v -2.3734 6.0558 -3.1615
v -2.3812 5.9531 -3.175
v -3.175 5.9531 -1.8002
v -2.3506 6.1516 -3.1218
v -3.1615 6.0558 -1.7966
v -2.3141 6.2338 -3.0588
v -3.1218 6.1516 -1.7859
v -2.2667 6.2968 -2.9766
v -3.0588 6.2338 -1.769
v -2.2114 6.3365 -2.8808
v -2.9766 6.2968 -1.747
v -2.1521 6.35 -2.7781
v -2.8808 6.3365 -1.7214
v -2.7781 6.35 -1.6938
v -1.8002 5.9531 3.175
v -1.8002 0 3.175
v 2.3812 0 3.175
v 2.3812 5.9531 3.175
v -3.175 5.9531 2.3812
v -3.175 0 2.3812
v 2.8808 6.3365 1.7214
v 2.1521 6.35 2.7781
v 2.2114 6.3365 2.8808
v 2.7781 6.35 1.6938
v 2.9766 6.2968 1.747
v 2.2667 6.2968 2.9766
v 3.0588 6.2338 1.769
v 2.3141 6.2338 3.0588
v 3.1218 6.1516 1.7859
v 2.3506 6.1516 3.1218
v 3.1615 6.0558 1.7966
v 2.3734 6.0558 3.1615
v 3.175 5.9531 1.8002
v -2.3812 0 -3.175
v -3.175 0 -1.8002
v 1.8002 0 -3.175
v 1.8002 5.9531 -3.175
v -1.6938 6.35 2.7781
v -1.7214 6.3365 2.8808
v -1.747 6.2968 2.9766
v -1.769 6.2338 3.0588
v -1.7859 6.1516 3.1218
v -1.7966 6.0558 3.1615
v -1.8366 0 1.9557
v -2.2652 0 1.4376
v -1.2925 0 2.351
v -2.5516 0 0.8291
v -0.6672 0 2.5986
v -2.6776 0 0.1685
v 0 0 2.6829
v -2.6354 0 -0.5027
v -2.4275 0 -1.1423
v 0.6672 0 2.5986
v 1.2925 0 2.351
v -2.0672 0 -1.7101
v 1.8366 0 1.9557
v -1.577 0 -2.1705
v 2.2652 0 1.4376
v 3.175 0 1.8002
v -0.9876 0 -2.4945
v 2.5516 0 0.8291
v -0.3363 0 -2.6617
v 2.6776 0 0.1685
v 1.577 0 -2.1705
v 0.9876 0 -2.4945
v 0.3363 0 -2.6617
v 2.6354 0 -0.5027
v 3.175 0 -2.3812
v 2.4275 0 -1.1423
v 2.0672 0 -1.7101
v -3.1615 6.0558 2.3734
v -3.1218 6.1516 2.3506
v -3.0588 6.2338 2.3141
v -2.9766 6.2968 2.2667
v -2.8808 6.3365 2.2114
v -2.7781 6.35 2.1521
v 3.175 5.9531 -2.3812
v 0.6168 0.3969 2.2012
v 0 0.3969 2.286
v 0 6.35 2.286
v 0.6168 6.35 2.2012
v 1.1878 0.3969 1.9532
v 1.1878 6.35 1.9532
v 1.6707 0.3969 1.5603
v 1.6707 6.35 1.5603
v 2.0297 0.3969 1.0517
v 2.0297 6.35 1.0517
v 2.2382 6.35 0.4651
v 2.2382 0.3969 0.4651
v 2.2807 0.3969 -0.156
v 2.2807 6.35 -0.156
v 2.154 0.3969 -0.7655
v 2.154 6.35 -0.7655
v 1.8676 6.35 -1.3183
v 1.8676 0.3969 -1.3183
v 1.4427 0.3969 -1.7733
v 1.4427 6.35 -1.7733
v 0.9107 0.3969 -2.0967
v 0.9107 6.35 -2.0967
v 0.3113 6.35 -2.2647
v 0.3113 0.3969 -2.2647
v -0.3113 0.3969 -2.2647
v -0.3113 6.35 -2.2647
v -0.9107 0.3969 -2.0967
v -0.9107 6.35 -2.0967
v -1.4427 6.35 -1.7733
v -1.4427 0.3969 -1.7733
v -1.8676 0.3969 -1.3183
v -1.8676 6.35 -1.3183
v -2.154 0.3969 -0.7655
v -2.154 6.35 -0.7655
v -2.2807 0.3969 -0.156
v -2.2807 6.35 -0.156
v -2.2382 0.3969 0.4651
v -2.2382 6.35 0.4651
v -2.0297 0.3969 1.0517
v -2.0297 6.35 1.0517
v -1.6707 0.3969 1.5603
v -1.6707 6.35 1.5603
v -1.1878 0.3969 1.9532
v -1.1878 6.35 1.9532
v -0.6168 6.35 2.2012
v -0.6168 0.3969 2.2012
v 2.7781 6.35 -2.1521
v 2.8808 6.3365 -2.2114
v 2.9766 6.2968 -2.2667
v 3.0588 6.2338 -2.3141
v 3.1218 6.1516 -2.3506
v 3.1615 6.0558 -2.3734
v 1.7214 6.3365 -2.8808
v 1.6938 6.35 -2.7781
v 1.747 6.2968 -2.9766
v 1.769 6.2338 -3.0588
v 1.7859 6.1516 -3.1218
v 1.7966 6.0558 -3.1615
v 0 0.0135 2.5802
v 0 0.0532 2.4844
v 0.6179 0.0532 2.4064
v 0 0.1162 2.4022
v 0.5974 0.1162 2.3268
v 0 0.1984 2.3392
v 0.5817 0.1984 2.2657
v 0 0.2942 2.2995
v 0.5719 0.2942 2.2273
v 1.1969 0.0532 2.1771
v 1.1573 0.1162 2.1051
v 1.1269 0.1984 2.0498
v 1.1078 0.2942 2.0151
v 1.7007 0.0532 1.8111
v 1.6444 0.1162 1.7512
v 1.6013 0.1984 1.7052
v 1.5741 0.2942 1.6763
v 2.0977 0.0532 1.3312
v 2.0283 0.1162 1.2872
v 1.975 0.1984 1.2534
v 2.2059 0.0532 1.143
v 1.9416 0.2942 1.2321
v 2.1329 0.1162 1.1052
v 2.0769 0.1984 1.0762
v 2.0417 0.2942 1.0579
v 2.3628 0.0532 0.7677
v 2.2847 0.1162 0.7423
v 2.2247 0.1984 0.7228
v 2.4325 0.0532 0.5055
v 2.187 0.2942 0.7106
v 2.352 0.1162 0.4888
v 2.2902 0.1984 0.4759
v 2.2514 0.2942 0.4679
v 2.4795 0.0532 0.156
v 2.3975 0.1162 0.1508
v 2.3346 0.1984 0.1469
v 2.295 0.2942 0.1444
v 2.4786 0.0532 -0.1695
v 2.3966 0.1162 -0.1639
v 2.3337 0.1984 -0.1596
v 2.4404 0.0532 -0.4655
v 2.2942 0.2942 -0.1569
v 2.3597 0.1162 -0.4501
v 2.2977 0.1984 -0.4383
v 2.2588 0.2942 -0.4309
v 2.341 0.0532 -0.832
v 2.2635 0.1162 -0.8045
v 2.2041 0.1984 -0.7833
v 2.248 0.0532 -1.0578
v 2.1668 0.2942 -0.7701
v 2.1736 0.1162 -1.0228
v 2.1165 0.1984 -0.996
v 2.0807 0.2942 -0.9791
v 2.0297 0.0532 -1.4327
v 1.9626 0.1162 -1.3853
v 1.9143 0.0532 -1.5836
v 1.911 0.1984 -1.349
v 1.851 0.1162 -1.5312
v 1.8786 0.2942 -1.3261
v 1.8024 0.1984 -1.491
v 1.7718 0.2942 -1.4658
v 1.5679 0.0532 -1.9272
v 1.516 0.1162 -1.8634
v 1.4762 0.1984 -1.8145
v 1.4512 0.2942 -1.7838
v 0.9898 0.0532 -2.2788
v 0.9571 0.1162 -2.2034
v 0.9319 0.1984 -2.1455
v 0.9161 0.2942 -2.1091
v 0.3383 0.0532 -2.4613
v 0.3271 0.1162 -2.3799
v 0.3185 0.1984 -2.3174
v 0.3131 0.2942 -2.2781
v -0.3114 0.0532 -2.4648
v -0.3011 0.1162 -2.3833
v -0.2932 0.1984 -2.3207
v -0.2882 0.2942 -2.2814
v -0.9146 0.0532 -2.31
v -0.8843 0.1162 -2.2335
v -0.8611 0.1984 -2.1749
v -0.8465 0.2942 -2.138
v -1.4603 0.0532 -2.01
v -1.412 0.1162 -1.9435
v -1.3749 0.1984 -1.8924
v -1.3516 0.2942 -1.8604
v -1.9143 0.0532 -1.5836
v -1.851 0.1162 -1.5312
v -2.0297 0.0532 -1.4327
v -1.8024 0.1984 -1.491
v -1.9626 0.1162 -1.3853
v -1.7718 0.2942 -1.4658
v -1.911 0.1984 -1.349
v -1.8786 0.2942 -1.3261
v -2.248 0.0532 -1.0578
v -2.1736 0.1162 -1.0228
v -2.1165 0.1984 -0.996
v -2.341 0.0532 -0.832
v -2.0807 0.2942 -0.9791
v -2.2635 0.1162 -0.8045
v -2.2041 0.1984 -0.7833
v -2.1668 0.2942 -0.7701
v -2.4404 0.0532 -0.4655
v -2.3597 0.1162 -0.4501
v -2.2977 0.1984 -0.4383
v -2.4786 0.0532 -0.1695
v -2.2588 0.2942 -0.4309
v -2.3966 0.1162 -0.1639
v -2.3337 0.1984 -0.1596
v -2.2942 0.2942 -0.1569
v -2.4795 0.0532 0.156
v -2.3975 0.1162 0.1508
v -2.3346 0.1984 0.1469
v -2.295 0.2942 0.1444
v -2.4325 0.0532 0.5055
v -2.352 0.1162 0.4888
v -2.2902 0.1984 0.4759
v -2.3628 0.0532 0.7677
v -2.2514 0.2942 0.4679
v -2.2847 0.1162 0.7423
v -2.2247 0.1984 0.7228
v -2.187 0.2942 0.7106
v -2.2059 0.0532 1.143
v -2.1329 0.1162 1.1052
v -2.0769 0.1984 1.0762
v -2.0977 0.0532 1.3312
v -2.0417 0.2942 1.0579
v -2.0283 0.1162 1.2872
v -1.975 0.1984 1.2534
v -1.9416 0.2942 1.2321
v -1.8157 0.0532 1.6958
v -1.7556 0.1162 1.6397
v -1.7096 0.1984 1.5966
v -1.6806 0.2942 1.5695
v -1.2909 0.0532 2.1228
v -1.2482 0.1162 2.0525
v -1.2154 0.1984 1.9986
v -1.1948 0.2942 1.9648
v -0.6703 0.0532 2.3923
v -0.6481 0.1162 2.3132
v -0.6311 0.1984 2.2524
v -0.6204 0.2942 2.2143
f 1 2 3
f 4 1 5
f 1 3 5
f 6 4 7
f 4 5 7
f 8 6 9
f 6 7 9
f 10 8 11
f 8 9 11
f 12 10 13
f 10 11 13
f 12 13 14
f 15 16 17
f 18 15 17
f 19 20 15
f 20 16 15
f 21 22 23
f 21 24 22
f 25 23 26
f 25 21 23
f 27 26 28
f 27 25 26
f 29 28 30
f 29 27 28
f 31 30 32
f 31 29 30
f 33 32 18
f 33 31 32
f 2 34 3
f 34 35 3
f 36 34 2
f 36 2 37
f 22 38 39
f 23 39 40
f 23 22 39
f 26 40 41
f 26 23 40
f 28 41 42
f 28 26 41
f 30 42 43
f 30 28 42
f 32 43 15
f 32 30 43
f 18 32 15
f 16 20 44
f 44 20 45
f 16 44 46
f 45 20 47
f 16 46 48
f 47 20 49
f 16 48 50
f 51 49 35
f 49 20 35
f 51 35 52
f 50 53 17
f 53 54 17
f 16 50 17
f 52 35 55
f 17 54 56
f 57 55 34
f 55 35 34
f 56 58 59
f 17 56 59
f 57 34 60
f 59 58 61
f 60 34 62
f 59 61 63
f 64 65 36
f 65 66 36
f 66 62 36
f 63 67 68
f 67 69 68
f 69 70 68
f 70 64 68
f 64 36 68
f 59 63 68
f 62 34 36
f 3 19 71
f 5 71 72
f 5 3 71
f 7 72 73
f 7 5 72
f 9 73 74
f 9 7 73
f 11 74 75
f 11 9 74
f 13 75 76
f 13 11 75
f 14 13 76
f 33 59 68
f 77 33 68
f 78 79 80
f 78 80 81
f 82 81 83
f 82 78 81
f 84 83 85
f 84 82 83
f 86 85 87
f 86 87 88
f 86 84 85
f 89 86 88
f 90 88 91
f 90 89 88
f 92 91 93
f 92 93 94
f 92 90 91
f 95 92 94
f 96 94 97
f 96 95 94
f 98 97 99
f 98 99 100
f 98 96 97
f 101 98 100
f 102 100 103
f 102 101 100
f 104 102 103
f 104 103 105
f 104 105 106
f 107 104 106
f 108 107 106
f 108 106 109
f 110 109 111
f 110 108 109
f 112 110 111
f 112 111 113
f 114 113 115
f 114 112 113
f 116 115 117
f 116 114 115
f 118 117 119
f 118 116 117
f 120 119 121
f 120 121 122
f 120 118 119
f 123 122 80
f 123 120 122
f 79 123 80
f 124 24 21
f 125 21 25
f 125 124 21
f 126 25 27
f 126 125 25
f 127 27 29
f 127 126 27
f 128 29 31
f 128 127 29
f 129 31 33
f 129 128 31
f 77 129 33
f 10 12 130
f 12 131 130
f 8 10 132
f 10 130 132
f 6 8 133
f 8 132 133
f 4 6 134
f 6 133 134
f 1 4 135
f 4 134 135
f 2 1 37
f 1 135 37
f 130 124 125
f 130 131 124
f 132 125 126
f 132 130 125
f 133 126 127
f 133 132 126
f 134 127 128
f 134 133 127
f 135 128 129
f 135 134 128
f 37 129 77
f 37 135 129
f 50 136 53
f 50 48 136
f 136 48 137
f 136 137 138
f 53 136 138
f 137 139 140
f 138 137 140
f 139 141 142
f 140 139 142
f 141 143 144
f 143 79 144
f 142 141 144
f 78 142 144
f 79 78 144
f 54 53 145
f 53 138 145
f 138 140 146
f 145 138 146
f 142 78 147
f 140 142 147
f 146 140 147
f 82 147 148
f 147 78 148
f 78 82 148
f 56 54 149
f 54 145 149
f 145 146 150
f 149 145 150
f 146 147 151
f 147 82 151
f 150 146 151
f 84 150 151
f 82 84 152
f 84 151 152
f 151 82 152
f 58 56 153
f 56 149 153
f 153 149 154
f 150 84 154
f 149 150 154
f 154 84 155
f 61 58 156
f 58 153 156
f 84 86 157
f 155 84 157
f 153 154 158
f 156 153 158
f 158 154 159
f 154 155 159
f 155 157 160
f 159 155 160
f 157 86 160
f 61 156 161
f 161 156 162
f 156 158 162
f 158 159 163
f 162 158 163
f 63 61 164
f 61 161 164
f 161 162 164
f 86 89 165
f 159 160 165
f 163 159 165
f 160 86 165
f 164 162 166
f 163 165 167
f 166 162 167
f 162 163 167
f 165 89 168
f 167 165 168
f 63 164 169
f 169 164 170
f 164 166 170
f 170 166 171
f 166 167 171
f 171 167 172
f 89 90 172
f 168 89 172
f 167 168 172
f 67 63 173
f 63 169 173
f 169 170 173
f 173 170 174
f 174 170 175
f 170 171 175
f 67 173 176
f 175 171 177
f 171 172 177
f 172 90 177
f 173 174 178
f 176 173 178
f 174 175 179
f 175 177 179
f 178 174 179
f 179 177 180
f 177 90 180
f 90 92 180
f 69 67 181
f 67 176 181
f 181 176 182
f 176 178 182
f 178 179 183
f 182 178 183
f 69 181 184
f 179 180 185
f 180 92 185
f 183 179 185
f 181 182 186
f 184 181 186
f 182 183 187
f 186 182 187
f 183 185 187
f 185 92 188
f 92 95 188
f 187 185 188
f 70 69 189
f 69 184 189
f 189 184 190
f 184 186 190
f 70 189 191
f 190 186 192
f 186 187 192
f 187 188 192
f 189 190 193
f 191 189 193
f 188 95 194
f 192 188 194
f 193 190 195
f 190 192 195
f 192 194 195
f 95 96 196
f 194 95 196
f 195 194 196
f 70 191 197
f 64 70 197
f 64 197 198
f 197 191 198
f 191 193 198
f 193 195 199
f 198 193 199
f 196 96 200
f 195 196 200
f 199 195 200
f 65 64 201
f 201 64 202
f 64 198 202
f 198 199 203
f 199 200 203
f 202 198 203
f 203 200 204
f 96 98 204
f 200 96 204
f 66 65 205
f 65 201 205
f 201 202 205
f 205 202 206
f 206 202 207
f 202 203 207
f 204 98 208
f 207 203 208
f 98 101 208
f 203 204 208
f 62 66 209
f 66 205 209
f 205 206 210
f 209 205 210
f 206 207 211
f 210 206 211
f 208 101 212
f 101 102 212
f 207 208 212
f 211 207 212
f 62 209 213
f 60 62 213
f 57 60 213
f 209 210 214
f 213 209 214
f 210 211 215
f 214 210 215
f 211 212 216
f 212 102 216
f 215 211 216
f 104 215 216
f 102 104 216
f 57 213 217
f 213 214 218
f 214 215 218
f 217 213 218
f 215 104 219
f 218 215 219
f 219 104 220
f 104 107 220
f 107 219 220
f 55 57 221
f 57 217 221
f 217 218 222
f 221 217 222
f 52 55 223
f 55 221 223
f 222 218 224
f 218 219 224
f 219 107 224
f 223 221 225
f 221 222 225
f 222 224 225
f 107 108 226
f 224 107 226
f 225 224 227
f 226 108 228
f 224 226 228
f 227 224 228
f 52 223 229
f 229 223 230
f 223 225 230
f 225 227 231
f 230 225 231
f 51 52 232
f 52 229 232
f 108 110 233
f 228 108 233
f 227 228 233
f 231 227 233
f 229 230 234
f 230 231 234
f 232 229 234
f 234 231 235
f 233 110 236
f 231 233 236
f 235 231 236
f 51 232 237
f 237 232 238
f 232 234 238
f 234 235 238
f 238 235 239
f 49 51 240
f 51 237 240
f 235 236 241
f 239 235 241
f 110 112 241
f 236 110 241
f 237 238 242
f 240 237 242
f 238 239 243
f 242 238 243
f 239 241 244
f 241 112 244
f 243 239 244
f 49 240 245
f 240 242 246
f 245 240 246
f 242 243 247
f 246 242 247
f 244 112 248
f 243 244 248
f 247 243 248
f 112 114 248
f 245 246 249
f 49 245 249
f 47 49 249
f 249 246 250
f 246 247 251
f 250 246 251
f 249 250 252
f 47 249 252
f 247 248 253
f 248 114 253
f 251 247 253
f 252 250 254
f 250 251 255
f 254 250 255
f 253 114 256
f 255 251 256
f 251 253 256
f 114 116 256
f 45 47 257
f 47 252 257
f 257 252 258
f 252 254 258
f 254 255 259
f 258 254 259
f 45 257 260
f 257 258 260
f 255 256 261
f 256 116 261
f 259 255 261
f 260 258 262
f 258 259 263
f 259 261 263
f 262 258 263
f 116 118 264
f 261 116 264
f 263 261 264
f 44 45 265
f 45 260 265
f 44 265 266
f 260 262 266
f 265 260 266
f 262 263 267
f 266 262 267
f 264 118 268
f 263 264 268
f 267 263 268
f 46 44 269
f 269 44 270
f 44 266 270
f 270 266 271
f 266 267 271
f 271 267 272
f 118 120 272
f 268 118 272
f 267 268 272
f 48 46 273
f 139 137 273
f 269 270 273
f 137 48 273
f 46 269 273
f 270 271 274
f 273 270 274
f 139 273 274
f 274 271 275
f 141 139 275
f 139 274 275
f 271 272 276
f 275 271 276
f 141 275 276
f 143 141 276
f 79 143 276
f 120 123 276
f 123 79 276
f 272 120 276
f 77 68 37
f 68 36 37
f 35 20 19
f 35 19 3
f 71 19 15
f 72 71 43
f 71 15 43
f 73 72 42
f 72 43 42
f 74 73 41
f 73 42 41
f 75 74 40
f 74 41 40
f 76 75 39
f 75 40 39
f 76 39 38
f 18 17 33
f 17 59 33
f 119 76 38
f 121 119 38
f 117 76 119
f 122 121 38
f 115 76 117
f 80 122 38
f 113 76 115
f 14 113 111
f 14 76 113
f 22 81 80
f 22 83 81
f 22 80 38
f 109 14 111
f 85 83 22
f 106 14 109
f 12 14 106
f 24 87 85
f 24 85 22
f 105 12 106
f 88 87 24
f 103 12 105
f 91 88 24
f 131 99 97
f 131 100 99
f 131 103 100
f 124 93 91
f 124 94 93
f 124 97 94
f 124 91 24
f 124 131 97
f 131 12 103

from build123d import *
from OCP.BRepFilletAPI import BRepFilletAPI_MakeChamfer

# Parameters (mm, degrees)
SKETCH1_W           = 6.35
SKETCH1_H           = 6.35
SKETCH1_R           = 2.286
BOSS_EXTRUDE1_DEPTH = 6.35
CHAMFER1_SIZE       = 0.79375
CHAMFER1_SIZE2      = 1.374815329
FILLET1_R           = 0.396875
FILLET2_R           = 0.396875


with BuildPart() as part:
    # Sketch1 → Boss-Extrude1 (new body)
    with BuildSketch(Plane(origin=(0, 0, 0), x_dir=(1, 0, 0), z_dir=(0, 1, 0))):
        Rectangle(SKETCH1_W, SKETCH1_H)
        with Locations(Location((0, 0, 0), (0, 0, 270))):
            Circle(SKETCH1_R, mode=Mode.SUBTRACT)
    extrude(amount=BOSS_EXTRUDE1_DEPTH)

    # Chamfer1: one chamfer whose edges measure the first distance from different faces: ONE call of the kernel's chamfer builder (chamfer() names one face for all edges)
    chamfer1_edges_1 = [part.edges().sort_by_distance(p)[0] for p in [
        (3.175, 3.175, 3.175),
    ]]
    chamfer1_side_1 = [part.faces().sort_by_distance(p)[0] for p in [
        (0, 3.175, 3.175),
    ]]
    chamfer1_edges_2 = [part.edges().sort_by_distance(p)[0] for p in [
        (-3.175, 3.175, 3.175),
    ]]
    chamfer1_side_2 = [part.faces().sort_by_distance(p)[0] for p in [
        (-3.175, 3.175, 0),
    ]]
    chamfer1_edges_3 = [part.edges().sort_by_distance(p)[0] for p in [
        (-3.175, 3.175, -3.175),
    ]]
    chamfer1_side_3 = [part.faces().sort_by_distance(p)[0] for p in [
        (0, 3.175, -3.175),
    ]]
    chamfer1_edges_4 = [part.edges().sort_by_distance(p)[0] for p in [
        (3.175, 3.175, -3.175),
    ]]
    chamfer1_side_4 = [part.faces().sort_by_distance(p)[0] for p in [
        (3.175, 3.175, 0),
    ]]
    chamfer1 = BRepFilletAPI_MakeChamfer(part.part.solid().wrapped)
    for e in chamfer1_edges_1:
        chamfer1.Add(CHAMFER1_SIZE, CHAMFER1_SIZE2, e.wrapped, chamfer1_side_1[0].wrapped)  # the first distance lies on this face
    for e in chamfer1_edges_2:
        chamfer1.Add(CHAMFER1_SIZE, CHAMFER1_SIZE2, e.wrapped, chamfer1_side_2[0].wrapped)  # the first distance lies on this face
    for e in chamfer1_edges_3:
        chamfer1.Add(CHAMFER1_SIZE, CHAMFER1_SIZE2, e.wrapped, chamfer1_side_3[0].wrapped)  # the first distance lies on this face
    for e in chamfer1_edges_4:
        chamfer1.Add(CHAMFER1_SIZE, CHAMFER1_SIZE2, e.wrapped, chamfer1_side_4[0].wrapped)  # the first distance lies on this face
    add(Compound.cast(chamfer1.Shape()), mode=Mode.REPLACE)

    # Fillet1
    fillet1_edges = [part.edges().sort_by_distance(p)[0] for p in [
        (-3.175, 6.35, 0.290532664),
        (-0.290532664, 6.35, -3.175),
        (3.175, 6.35, -0.290532664),
        (0.290532664, 6.35, 3.175),
        (-2.487592336, 6.35, 2.778125),
        (2.778125, 6.35, 2.487592336),
        (2.487592336, 6.35, -2.778125),
        (-2.778125, 6.35, -2.487592336),
    ]]
    fillet(fillet1_edges, radius=FILLET1_R)

    # Fillet2
    fillet2_edges = [part.edges().sort_by_distance(p)[0] for p in [
        (0, 0, -2.286),
    ]]
    fillet(fillet2_edges, radius=FILLET2_R)


solid = part.part
